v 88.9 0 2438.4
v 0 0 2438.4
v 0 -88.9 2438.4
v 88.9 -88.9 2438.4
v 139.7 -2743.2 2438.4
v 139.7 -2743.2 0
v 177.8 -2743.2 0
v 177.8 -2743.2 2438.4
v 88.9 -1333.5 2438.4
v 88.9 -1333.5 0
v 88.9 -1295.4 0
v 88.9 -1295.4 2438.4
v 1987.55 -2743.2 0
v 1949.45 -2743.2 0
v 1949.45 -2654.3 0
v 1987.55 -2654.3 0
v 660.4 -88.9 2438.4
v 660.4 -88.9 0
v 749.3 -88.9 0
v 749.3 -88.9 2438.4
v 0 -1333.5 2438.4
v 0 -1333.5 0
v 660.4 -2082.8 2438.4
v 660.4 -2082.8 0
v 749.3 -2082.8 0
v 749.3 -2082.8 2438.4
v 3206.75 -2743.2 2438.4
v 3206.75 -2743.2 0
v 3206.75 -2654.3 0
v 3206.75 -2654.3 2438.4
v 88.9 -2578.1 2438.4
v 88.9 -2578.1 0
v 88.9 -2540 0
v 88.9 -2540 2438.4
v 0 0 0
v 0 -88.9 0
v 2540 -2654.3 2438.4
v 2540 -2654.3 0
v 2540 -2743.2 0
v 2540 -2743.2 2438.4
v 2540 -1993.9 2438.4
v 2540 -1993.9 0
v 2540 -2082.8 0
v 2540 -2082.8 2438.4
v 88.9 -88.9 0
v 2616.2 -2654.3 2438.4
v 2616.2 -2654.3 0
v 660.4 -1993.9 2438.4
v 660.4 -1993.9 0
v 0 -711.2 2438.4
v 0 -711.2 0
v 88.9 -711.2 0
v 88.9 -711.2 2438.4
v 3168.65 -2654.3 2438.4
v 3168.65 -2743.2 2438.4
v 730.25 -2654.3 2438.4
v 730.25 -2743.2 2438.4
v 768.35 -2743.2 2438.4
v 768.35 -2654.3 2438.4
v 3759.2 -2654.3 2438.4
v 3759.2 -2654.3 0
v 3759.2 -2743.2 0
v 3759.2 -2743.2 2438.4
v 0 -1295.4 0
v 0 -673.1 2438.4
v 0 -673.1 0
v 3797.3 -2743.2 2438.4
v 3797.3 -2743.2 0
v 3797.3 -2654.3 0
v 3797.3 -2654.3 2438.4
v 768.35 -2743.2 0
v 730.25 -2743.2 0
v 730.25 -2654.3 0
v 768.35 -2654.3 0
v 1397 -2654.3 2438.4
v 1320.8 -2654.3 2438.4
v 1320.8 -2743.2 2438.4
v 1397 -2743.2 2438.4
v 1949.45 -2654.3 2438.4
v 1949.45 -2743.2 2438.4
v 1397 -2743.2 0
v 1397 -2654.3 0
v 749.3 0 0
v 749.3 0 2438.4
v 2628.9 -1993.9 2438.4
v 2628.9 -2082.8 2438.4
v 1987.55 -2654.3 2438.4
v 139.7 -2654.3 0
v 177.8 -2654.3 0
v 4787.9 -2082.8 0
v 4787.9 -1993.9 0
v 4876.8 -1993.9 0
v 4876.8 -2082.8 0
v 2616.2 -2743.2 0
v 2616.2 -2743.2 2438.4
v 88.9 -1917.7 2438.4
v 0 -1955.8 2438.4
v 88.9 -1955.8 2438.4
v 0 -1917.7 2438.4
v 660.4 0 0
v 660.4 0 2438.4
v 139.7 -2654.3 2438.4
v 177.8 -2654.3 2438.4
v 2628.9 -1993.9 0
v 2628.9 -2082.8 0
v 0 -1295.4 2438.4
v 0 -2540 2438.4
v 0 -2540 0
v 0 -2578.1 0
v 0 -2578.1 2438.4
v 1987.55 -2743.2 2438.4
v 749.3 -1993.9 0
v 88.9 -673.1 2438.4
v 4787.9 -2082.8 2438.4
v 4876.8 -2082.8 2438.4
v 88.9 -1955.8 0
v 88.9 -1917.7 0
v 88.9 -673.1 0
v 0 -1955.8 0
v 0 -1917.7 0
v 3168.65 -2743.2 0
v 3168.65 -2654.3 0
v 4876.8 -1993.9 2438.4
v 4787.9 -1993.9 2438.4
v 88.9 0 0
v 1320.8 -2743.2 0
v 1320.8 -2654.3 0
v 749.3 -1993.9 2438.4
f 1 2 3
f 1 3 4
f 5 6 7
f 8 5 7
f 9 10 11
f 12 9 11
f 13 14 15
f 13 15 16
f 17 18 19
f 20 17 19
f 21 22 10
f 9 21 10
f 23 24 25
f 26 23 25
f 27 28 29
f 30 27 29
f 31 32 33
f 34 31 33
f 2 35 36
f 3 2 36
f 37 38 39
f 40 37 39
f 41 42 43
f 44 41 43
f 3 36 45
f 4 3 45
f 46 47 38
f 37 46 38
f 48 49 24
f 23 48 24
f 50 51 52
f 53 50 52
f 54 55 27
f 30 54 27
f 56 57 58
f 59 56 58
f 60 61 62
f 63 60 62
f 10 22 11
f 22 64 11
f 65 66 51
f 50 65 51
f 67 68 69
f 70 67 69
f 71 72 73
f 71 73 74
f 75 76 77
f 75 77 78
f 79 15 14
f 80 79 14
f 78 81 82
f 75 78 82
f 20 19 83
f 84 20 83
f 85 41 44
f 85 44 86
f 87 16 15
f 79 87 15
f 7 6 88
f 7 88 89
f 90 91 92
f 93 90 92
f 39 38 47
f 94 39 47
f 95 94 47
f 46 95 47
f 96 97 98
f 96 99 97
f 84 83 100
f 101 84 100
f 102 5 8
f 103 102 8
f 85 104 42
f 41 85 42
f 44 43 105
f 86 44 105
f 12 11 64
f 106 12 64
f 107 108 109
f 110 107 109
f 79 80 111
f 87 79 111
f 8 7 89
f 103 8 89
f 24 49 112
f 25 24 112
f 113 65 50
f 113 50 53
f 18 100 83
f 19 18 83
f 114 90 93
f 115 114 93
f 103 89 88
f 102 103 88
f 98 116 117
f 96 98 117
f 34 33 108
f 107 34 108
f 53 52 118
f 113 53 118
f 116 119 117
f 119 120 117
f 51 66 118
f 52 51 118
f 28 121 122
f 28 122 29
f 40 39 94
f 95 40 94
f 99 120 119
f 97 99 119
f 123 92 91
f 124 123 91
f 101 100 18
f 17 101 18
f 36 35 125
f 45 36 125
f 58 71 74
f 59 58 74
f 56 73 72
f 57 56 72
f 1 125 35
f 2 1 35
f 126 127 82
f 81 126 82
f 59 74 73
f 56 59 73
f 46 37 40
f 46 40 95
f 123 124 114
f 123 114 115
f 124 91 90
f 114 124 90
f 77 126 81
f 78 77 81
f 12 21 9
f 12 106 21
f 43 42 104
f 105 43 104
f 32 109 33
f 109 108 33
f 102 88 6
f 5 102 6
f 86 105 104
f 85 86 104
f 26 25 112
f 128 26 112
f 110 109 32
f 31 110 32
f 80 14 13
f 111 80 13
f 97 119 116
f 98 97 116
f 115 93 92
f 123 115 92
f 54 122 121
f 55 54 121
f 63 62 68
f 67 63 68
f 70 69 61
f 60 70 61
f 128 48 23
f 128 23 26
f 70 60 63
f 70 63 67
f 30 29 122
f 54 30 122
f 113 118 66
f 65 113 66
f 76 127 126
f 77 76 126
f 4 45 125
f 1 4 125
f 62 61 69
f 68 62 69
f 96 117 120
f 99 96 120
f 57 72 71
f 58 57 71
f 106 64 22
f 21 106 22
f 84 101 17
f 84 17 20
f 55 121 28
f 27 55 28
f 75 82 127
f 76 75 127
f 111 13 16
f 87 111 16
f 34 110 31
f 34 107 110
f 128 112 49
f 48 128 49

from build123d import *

# Parameters (mm, degrees)
F1_DEPTH = 2438.4
F2_DEPTH = 2438.4


with BuildPart() as f1:
    # F0 (on Top) → F1 (new body)
    with BuildSketch(Plane.XY):
        Polygon((44.45, -44.45), (88.9, 0), (0, 0), align=None)
        Polygon((44.45, -44.45), (0, 0), (0, -88.9), align=None)
        Polygon((0, -88.9), (88.9, -88.9), (44.45, -44.45), align=None)
        Polygon((88.9, -88.9), (88.9, 0), (44.45, -44.45), align=None)
    extrude(amount=F1_DEPTH)


with BuildPart() as f1b:
    # F0 (on Top) → F1, piece 2 (new body)
    with BuildSketch(Plane.XY):
        Polygon((704.85, -44.45), (749.3, 0), (660.4, 0), align=None)
        Polygon((660.4, 0), (660.4, -88.9), (704.85, -44.45), align=None)
        Polygon((660.4, -88.9), (749.3, -88.9), (704.85, -44.45), align=None)
        Polygon((704.85, -44.45), (749.3, -88.9), (749.3, 0), align=None)
    extrude(amount=F1_DEPTH)


with BuildPart() as f1c:
    # F0 (on Top) → F1, piece 3 (new body)
    with BuildSketch(Plane.XY):
        Polygon((704.85, -2038.35), (749.3, -1993.9), (660.4, -1993.9), align=None)
        Polygon((660.4, -1993.9), (660.4, -2082.8), (704.85, -2038.35), align=None)
        Polygon((660.4, -2082.8), (749.3, -2082.8), (704.85, -2038.35), align=None)
        Polygon((704.85, -2038.35), (749.3, -2082.8), (749.3, -1993.9), align=None)
    extrude(amount=F1_DEPTH)


with BuildPart() as f1d:
    # F0 (on Top) → F1, piece 4 (new body)
    with BuildSketch(Plane.XY):
        Polygon((2540, -1993.9), (2540, -2082.8), (2584.45, -2038.35), align=None)
        Polygon((2628.9, -1993.9), (2540, -1993.9), (2584.45, -2038.35), align=None)
        Polygon((2584.45, -2038.35), (2628.9, -2082.8), (2628.9, -1993.9), align=None)
        Polygon((2584.45, -2038.35), (2540, -2082.8), (2628.9, -2082.8), align=None)
    extrude(amount=F1_DEPTH)


with BuildPart() as f1e:
    # F0 (on Top) → F1, piece 5 (new body)
    with BuildSketch(Plane.XY):
        Polygon((4832.35, -2038.35), (4787.9, -1993.9), (4787.9, -2082.8), align=None)
        Polygon((4876.8, -1993.9), (4787.9, -1993.9), (4832.35, -2038.35), align=None)
        Polygon((4876.8, -2082.8), (4876.8, -1993.9), (4832.35, -2038.35), align=None)
        Polygon((4832.35, -2038.35), (4787.9, -2082.8), (4876.8, -2082.8), align=None)
    extrude(amount=F1_DEPTH)


with BuildPart() as f2:
    # F0 (on Top) → F2 (new body)
    with BuildSketch(Plane.XY):
        Polygon((3778.25, -2698.75), (3759.2, -2654.3), (3759.2, -2743.2), align=None)
        Polygon((3778.25, -2698.75), (3797.3, -2654.3), (3759.2, -2654.3), align=None)
        Polygon((3797.3, -2743.2), (3778.25, -2698.75), (3759.2, -2743.2), align=None)
        Polygon((3797.3, -2743.2), (3797.3, -2654.3), (3778.25, -2698.75), align=None)
    extrude(amount=F2_DEPTH)


with BuildPart() as f2b:
    # F0 (on Top) → F2, piece 2 (new body)
    with BuildSketch(Plane.XY):
        Polygon((3206.75, -2654.3), (3168.65, -2654.3), (3187.7, -2698.75), align=None)
        Polygon((3187.7, -2698.75), (3168.65, -2654.3), (3168.65, -2743.2), align=None)
        Polygon((3206.75, -2743.2), (3187.7, -2698.75), (3168.65, -2743.2), align=None)
        Polygon((3206.75, -2654.3), (3187.7, -2698.75), (3206.75, -2743.2), align=None)
    extrude(amount=F2_DEPTH)


with BuildPart() as f2c:
    # F0 (on Top) → F2, piece 3 (new body)
    with BuildSketch(Plane.XY):
        Polygon((2559.05, -2698.75), (2540, -2654.3), (2540, -2743.2), align=None)
        Polygon((2559.05, -2698.75), (2578.1, -2654.3), (2540, -2654.3), align=None)
        Polygon((2616.2, -2654.3), (2578.1, -2654.3), (2597.15, -2698.75), align=None)
        Polygon((2616.2, -2743.2), (2616.2, -2654.3), (2597.15, -2698.75), align=None)
        Polygon((2597.15, -2698.75), (2578.1, -2743.2), (2616.2, -2743.2), align=None)
        Polygon((2578.1, -2743.2), (2559.05, -2698.75), (2540, -2743.2), align=None)
        Polygon((2597.15, -2698.75), (2578.1, -2654.3), (2578.1, -2743.2), align=None)
        Polygon((2578.1, -2743.2), (2578.1, -2654.3), (2559.05, -2698.75), align=None)
    extrude(amount=F2_DEPTH)


with BuildPart() as f2d:
    # F0 (on Top) → F2, piece 4 (new body)
    with BuildSketch(Plane.XY):
        Polygon((1987.55, -2654.3), (1949.45, -2654.3), (1968.5, -2698.75), align=None)
        Polygon((1987.55, -2654.3), (1968.5, -2698.75), (1987.55, -2743.2), align=None)
        Polygon((1968.5, -2698.75), (1949.45, -2654.3), (1949.45, -2743.2), align=None)
        Polygon((1987.55, -2743.2), (1968.5, -2698.75), (1949.45, -2743.2), align=None)
    extrude(amount=F2_DEPTH)


with BuildPart() as f2e:
    # F0 (on Top) → F2, piece 5 (new body)
    with BuildSketch(Plane.XY):
        Polygon((1397, -2654.3), (1358.9, -2654.3), (1377.95, -2698.75), align=None)
        Polygon((1358.9, -2654.3), (1320.8, -2654.3), (1339.85, -2698.75), align=None)
        Polygon((1339.85, -2698.75), (1320.8, -2654.3), (1320.8, -2743.2), align=None)
        Polygon((1358.9, -2743.2), (1358.9, -2654.3), (1339.85, -2698.75), align=None)
        Polygon((1377.95, -2698.75), (1358.9, -2654.3), (1358.9, -2743.2), align=None)
        Polygon((1397, -2743.2), (1397, -2654.3), (1377.95, -2698.75), align=None)
        Polygon((1377.95, -2698.75), (1358.9, -2743.2), (1397, -2743.2), align=None)
        Polygon((1339.85, -2698.75), (1320.8, -2743.2), (1358.9, -2743.2), align=None)
    extrude(amount=F2_DEPTH)


with BuildPart() as f2f:
    # F0 (on Top) → F2, piece 6 (new body)
    with BuildSketch(Plane.XY):
        Polygon((768.35, -2654.3), (730.25, -2654.3), (749.3, -2698.75), align=None)
        Polygon((768.35, -2743.2), (768.35, -2654.3), (749.3, -2698.75), align=None)
        Polygon((749.3, -2698.75), (730.25, -2654.3), (730.25, -2743.2), align=None)
        Polygon((749.3, -2698.75), (730.25, -2743.2), (768.35, -2743.2), align=None)
    extrude(amount=F2_DEPTH)


with BuildPart() as f2g:
    # F0 (on Top) → F2, piece 7 (new body)
    with BuildSketch(Plane.XY):
        Polygon((177.8, -2654.3), (139.7, -2654.3), (158.75, -2698.75), align=None)
        Polygon((158.75, -2698.75), (139.7, -2654.3), (139.7, -2743.2), align=None)
        Polygon((158.75, -2698.75), (139.7, -2743.2), (177.8, -2743.2), align=None)
        Polygon((177.8, -2743.2), (177.8, -2654.3), (158.75, -2698.75), align=None)
    extrude(amount=F2_DEPTH)


with BuildPart() as f2h:
    # F0 (on Top) → F2, piece 8 (new body)
    with BuildSketch(Plane.XY):
        Polygon((44.45, -2559.05), (0, -2578.1), (88.9, -2578.1), align=None)
        Polygon((88.9, -2540), (0, -2540), (44.45, -2559.05), align=None)
        Polygon((88.9, -2578.1), (88.9, -2540), (44.45, -2559.05), align=None)
        Polygon((44.45, -2559.05), (0, -2540), (0, -2578.1), align=None)
    extrude(amount=F2_DEPTH)


with BuildPart() as f2i:
    # F0 (on Top) → F2, piece 9 (new body)
    with BuildSketch(Plane.XY):
        Polygon((44.45, -1936.75), (0, -1955.8), (88.9, -1955.8), align=None)
        Polygon((88.9, -1955.8), (88.9, -1917.7), (44.45, -1936.75), align=None)
        Polygon((44.45, -1936.75), (0, -1917.7), (0, -1955.8), align=None)
        Polygon((88.9, -1917.7), (0, -1917.7), (44.45, -1936.75), align=None)
    extrude(amount=F2_DEPTH)


with BuildPart() as f2j:
    # F0 (on Top) → F2, piece 10 (new body)
    with BuildSketch(Plane.XY):
        Polygon((44.45, -1314.45), (0, -1333.5), (88.9, -1333.5), align=None)
        Polygon((88.9, -1333.5), (88.9, -1295.4), (44.45, -1314.45), align=None)
        Polygon((44.45, -1314.45), (0, -1295.4), (0, -1333.5), align=None)
        Polygon((88.9, -1295.4), (0, -1295.4), (44.45, -1314.45), align=None)
    extrude(amount=F2_DEPTH)


with BuildPart() as f2k:
    # F0 (on Top) → F2, piece 11 (new body)
    with BuildSketch(Plane.XY):
        Polygon((88.9, -673.1), (0, -673.1), (44.45, -692.15), align=None)
        Polygon((44.45, -692.15), (0, -673.1), (0, -711.2), align=None)
        Polygon((88.9, -711.2), (88.9, -673.1), (44.45, -692.15), align=None)
        Polygon((44.45, -692.15), (0, -711.2), (88.9, -711.2), align=None)
    extrude(amount=F2_DEPTH)


solid = Compound([f1.part, f1b.part, f1c.part, f1d.part, f1e.part, f2.part, f2b.part, f2c.part, f2d.part, f2e.part, f2f.part, f2g.part, f2h.part, f2i.part, f2j.part, f2k.part])
